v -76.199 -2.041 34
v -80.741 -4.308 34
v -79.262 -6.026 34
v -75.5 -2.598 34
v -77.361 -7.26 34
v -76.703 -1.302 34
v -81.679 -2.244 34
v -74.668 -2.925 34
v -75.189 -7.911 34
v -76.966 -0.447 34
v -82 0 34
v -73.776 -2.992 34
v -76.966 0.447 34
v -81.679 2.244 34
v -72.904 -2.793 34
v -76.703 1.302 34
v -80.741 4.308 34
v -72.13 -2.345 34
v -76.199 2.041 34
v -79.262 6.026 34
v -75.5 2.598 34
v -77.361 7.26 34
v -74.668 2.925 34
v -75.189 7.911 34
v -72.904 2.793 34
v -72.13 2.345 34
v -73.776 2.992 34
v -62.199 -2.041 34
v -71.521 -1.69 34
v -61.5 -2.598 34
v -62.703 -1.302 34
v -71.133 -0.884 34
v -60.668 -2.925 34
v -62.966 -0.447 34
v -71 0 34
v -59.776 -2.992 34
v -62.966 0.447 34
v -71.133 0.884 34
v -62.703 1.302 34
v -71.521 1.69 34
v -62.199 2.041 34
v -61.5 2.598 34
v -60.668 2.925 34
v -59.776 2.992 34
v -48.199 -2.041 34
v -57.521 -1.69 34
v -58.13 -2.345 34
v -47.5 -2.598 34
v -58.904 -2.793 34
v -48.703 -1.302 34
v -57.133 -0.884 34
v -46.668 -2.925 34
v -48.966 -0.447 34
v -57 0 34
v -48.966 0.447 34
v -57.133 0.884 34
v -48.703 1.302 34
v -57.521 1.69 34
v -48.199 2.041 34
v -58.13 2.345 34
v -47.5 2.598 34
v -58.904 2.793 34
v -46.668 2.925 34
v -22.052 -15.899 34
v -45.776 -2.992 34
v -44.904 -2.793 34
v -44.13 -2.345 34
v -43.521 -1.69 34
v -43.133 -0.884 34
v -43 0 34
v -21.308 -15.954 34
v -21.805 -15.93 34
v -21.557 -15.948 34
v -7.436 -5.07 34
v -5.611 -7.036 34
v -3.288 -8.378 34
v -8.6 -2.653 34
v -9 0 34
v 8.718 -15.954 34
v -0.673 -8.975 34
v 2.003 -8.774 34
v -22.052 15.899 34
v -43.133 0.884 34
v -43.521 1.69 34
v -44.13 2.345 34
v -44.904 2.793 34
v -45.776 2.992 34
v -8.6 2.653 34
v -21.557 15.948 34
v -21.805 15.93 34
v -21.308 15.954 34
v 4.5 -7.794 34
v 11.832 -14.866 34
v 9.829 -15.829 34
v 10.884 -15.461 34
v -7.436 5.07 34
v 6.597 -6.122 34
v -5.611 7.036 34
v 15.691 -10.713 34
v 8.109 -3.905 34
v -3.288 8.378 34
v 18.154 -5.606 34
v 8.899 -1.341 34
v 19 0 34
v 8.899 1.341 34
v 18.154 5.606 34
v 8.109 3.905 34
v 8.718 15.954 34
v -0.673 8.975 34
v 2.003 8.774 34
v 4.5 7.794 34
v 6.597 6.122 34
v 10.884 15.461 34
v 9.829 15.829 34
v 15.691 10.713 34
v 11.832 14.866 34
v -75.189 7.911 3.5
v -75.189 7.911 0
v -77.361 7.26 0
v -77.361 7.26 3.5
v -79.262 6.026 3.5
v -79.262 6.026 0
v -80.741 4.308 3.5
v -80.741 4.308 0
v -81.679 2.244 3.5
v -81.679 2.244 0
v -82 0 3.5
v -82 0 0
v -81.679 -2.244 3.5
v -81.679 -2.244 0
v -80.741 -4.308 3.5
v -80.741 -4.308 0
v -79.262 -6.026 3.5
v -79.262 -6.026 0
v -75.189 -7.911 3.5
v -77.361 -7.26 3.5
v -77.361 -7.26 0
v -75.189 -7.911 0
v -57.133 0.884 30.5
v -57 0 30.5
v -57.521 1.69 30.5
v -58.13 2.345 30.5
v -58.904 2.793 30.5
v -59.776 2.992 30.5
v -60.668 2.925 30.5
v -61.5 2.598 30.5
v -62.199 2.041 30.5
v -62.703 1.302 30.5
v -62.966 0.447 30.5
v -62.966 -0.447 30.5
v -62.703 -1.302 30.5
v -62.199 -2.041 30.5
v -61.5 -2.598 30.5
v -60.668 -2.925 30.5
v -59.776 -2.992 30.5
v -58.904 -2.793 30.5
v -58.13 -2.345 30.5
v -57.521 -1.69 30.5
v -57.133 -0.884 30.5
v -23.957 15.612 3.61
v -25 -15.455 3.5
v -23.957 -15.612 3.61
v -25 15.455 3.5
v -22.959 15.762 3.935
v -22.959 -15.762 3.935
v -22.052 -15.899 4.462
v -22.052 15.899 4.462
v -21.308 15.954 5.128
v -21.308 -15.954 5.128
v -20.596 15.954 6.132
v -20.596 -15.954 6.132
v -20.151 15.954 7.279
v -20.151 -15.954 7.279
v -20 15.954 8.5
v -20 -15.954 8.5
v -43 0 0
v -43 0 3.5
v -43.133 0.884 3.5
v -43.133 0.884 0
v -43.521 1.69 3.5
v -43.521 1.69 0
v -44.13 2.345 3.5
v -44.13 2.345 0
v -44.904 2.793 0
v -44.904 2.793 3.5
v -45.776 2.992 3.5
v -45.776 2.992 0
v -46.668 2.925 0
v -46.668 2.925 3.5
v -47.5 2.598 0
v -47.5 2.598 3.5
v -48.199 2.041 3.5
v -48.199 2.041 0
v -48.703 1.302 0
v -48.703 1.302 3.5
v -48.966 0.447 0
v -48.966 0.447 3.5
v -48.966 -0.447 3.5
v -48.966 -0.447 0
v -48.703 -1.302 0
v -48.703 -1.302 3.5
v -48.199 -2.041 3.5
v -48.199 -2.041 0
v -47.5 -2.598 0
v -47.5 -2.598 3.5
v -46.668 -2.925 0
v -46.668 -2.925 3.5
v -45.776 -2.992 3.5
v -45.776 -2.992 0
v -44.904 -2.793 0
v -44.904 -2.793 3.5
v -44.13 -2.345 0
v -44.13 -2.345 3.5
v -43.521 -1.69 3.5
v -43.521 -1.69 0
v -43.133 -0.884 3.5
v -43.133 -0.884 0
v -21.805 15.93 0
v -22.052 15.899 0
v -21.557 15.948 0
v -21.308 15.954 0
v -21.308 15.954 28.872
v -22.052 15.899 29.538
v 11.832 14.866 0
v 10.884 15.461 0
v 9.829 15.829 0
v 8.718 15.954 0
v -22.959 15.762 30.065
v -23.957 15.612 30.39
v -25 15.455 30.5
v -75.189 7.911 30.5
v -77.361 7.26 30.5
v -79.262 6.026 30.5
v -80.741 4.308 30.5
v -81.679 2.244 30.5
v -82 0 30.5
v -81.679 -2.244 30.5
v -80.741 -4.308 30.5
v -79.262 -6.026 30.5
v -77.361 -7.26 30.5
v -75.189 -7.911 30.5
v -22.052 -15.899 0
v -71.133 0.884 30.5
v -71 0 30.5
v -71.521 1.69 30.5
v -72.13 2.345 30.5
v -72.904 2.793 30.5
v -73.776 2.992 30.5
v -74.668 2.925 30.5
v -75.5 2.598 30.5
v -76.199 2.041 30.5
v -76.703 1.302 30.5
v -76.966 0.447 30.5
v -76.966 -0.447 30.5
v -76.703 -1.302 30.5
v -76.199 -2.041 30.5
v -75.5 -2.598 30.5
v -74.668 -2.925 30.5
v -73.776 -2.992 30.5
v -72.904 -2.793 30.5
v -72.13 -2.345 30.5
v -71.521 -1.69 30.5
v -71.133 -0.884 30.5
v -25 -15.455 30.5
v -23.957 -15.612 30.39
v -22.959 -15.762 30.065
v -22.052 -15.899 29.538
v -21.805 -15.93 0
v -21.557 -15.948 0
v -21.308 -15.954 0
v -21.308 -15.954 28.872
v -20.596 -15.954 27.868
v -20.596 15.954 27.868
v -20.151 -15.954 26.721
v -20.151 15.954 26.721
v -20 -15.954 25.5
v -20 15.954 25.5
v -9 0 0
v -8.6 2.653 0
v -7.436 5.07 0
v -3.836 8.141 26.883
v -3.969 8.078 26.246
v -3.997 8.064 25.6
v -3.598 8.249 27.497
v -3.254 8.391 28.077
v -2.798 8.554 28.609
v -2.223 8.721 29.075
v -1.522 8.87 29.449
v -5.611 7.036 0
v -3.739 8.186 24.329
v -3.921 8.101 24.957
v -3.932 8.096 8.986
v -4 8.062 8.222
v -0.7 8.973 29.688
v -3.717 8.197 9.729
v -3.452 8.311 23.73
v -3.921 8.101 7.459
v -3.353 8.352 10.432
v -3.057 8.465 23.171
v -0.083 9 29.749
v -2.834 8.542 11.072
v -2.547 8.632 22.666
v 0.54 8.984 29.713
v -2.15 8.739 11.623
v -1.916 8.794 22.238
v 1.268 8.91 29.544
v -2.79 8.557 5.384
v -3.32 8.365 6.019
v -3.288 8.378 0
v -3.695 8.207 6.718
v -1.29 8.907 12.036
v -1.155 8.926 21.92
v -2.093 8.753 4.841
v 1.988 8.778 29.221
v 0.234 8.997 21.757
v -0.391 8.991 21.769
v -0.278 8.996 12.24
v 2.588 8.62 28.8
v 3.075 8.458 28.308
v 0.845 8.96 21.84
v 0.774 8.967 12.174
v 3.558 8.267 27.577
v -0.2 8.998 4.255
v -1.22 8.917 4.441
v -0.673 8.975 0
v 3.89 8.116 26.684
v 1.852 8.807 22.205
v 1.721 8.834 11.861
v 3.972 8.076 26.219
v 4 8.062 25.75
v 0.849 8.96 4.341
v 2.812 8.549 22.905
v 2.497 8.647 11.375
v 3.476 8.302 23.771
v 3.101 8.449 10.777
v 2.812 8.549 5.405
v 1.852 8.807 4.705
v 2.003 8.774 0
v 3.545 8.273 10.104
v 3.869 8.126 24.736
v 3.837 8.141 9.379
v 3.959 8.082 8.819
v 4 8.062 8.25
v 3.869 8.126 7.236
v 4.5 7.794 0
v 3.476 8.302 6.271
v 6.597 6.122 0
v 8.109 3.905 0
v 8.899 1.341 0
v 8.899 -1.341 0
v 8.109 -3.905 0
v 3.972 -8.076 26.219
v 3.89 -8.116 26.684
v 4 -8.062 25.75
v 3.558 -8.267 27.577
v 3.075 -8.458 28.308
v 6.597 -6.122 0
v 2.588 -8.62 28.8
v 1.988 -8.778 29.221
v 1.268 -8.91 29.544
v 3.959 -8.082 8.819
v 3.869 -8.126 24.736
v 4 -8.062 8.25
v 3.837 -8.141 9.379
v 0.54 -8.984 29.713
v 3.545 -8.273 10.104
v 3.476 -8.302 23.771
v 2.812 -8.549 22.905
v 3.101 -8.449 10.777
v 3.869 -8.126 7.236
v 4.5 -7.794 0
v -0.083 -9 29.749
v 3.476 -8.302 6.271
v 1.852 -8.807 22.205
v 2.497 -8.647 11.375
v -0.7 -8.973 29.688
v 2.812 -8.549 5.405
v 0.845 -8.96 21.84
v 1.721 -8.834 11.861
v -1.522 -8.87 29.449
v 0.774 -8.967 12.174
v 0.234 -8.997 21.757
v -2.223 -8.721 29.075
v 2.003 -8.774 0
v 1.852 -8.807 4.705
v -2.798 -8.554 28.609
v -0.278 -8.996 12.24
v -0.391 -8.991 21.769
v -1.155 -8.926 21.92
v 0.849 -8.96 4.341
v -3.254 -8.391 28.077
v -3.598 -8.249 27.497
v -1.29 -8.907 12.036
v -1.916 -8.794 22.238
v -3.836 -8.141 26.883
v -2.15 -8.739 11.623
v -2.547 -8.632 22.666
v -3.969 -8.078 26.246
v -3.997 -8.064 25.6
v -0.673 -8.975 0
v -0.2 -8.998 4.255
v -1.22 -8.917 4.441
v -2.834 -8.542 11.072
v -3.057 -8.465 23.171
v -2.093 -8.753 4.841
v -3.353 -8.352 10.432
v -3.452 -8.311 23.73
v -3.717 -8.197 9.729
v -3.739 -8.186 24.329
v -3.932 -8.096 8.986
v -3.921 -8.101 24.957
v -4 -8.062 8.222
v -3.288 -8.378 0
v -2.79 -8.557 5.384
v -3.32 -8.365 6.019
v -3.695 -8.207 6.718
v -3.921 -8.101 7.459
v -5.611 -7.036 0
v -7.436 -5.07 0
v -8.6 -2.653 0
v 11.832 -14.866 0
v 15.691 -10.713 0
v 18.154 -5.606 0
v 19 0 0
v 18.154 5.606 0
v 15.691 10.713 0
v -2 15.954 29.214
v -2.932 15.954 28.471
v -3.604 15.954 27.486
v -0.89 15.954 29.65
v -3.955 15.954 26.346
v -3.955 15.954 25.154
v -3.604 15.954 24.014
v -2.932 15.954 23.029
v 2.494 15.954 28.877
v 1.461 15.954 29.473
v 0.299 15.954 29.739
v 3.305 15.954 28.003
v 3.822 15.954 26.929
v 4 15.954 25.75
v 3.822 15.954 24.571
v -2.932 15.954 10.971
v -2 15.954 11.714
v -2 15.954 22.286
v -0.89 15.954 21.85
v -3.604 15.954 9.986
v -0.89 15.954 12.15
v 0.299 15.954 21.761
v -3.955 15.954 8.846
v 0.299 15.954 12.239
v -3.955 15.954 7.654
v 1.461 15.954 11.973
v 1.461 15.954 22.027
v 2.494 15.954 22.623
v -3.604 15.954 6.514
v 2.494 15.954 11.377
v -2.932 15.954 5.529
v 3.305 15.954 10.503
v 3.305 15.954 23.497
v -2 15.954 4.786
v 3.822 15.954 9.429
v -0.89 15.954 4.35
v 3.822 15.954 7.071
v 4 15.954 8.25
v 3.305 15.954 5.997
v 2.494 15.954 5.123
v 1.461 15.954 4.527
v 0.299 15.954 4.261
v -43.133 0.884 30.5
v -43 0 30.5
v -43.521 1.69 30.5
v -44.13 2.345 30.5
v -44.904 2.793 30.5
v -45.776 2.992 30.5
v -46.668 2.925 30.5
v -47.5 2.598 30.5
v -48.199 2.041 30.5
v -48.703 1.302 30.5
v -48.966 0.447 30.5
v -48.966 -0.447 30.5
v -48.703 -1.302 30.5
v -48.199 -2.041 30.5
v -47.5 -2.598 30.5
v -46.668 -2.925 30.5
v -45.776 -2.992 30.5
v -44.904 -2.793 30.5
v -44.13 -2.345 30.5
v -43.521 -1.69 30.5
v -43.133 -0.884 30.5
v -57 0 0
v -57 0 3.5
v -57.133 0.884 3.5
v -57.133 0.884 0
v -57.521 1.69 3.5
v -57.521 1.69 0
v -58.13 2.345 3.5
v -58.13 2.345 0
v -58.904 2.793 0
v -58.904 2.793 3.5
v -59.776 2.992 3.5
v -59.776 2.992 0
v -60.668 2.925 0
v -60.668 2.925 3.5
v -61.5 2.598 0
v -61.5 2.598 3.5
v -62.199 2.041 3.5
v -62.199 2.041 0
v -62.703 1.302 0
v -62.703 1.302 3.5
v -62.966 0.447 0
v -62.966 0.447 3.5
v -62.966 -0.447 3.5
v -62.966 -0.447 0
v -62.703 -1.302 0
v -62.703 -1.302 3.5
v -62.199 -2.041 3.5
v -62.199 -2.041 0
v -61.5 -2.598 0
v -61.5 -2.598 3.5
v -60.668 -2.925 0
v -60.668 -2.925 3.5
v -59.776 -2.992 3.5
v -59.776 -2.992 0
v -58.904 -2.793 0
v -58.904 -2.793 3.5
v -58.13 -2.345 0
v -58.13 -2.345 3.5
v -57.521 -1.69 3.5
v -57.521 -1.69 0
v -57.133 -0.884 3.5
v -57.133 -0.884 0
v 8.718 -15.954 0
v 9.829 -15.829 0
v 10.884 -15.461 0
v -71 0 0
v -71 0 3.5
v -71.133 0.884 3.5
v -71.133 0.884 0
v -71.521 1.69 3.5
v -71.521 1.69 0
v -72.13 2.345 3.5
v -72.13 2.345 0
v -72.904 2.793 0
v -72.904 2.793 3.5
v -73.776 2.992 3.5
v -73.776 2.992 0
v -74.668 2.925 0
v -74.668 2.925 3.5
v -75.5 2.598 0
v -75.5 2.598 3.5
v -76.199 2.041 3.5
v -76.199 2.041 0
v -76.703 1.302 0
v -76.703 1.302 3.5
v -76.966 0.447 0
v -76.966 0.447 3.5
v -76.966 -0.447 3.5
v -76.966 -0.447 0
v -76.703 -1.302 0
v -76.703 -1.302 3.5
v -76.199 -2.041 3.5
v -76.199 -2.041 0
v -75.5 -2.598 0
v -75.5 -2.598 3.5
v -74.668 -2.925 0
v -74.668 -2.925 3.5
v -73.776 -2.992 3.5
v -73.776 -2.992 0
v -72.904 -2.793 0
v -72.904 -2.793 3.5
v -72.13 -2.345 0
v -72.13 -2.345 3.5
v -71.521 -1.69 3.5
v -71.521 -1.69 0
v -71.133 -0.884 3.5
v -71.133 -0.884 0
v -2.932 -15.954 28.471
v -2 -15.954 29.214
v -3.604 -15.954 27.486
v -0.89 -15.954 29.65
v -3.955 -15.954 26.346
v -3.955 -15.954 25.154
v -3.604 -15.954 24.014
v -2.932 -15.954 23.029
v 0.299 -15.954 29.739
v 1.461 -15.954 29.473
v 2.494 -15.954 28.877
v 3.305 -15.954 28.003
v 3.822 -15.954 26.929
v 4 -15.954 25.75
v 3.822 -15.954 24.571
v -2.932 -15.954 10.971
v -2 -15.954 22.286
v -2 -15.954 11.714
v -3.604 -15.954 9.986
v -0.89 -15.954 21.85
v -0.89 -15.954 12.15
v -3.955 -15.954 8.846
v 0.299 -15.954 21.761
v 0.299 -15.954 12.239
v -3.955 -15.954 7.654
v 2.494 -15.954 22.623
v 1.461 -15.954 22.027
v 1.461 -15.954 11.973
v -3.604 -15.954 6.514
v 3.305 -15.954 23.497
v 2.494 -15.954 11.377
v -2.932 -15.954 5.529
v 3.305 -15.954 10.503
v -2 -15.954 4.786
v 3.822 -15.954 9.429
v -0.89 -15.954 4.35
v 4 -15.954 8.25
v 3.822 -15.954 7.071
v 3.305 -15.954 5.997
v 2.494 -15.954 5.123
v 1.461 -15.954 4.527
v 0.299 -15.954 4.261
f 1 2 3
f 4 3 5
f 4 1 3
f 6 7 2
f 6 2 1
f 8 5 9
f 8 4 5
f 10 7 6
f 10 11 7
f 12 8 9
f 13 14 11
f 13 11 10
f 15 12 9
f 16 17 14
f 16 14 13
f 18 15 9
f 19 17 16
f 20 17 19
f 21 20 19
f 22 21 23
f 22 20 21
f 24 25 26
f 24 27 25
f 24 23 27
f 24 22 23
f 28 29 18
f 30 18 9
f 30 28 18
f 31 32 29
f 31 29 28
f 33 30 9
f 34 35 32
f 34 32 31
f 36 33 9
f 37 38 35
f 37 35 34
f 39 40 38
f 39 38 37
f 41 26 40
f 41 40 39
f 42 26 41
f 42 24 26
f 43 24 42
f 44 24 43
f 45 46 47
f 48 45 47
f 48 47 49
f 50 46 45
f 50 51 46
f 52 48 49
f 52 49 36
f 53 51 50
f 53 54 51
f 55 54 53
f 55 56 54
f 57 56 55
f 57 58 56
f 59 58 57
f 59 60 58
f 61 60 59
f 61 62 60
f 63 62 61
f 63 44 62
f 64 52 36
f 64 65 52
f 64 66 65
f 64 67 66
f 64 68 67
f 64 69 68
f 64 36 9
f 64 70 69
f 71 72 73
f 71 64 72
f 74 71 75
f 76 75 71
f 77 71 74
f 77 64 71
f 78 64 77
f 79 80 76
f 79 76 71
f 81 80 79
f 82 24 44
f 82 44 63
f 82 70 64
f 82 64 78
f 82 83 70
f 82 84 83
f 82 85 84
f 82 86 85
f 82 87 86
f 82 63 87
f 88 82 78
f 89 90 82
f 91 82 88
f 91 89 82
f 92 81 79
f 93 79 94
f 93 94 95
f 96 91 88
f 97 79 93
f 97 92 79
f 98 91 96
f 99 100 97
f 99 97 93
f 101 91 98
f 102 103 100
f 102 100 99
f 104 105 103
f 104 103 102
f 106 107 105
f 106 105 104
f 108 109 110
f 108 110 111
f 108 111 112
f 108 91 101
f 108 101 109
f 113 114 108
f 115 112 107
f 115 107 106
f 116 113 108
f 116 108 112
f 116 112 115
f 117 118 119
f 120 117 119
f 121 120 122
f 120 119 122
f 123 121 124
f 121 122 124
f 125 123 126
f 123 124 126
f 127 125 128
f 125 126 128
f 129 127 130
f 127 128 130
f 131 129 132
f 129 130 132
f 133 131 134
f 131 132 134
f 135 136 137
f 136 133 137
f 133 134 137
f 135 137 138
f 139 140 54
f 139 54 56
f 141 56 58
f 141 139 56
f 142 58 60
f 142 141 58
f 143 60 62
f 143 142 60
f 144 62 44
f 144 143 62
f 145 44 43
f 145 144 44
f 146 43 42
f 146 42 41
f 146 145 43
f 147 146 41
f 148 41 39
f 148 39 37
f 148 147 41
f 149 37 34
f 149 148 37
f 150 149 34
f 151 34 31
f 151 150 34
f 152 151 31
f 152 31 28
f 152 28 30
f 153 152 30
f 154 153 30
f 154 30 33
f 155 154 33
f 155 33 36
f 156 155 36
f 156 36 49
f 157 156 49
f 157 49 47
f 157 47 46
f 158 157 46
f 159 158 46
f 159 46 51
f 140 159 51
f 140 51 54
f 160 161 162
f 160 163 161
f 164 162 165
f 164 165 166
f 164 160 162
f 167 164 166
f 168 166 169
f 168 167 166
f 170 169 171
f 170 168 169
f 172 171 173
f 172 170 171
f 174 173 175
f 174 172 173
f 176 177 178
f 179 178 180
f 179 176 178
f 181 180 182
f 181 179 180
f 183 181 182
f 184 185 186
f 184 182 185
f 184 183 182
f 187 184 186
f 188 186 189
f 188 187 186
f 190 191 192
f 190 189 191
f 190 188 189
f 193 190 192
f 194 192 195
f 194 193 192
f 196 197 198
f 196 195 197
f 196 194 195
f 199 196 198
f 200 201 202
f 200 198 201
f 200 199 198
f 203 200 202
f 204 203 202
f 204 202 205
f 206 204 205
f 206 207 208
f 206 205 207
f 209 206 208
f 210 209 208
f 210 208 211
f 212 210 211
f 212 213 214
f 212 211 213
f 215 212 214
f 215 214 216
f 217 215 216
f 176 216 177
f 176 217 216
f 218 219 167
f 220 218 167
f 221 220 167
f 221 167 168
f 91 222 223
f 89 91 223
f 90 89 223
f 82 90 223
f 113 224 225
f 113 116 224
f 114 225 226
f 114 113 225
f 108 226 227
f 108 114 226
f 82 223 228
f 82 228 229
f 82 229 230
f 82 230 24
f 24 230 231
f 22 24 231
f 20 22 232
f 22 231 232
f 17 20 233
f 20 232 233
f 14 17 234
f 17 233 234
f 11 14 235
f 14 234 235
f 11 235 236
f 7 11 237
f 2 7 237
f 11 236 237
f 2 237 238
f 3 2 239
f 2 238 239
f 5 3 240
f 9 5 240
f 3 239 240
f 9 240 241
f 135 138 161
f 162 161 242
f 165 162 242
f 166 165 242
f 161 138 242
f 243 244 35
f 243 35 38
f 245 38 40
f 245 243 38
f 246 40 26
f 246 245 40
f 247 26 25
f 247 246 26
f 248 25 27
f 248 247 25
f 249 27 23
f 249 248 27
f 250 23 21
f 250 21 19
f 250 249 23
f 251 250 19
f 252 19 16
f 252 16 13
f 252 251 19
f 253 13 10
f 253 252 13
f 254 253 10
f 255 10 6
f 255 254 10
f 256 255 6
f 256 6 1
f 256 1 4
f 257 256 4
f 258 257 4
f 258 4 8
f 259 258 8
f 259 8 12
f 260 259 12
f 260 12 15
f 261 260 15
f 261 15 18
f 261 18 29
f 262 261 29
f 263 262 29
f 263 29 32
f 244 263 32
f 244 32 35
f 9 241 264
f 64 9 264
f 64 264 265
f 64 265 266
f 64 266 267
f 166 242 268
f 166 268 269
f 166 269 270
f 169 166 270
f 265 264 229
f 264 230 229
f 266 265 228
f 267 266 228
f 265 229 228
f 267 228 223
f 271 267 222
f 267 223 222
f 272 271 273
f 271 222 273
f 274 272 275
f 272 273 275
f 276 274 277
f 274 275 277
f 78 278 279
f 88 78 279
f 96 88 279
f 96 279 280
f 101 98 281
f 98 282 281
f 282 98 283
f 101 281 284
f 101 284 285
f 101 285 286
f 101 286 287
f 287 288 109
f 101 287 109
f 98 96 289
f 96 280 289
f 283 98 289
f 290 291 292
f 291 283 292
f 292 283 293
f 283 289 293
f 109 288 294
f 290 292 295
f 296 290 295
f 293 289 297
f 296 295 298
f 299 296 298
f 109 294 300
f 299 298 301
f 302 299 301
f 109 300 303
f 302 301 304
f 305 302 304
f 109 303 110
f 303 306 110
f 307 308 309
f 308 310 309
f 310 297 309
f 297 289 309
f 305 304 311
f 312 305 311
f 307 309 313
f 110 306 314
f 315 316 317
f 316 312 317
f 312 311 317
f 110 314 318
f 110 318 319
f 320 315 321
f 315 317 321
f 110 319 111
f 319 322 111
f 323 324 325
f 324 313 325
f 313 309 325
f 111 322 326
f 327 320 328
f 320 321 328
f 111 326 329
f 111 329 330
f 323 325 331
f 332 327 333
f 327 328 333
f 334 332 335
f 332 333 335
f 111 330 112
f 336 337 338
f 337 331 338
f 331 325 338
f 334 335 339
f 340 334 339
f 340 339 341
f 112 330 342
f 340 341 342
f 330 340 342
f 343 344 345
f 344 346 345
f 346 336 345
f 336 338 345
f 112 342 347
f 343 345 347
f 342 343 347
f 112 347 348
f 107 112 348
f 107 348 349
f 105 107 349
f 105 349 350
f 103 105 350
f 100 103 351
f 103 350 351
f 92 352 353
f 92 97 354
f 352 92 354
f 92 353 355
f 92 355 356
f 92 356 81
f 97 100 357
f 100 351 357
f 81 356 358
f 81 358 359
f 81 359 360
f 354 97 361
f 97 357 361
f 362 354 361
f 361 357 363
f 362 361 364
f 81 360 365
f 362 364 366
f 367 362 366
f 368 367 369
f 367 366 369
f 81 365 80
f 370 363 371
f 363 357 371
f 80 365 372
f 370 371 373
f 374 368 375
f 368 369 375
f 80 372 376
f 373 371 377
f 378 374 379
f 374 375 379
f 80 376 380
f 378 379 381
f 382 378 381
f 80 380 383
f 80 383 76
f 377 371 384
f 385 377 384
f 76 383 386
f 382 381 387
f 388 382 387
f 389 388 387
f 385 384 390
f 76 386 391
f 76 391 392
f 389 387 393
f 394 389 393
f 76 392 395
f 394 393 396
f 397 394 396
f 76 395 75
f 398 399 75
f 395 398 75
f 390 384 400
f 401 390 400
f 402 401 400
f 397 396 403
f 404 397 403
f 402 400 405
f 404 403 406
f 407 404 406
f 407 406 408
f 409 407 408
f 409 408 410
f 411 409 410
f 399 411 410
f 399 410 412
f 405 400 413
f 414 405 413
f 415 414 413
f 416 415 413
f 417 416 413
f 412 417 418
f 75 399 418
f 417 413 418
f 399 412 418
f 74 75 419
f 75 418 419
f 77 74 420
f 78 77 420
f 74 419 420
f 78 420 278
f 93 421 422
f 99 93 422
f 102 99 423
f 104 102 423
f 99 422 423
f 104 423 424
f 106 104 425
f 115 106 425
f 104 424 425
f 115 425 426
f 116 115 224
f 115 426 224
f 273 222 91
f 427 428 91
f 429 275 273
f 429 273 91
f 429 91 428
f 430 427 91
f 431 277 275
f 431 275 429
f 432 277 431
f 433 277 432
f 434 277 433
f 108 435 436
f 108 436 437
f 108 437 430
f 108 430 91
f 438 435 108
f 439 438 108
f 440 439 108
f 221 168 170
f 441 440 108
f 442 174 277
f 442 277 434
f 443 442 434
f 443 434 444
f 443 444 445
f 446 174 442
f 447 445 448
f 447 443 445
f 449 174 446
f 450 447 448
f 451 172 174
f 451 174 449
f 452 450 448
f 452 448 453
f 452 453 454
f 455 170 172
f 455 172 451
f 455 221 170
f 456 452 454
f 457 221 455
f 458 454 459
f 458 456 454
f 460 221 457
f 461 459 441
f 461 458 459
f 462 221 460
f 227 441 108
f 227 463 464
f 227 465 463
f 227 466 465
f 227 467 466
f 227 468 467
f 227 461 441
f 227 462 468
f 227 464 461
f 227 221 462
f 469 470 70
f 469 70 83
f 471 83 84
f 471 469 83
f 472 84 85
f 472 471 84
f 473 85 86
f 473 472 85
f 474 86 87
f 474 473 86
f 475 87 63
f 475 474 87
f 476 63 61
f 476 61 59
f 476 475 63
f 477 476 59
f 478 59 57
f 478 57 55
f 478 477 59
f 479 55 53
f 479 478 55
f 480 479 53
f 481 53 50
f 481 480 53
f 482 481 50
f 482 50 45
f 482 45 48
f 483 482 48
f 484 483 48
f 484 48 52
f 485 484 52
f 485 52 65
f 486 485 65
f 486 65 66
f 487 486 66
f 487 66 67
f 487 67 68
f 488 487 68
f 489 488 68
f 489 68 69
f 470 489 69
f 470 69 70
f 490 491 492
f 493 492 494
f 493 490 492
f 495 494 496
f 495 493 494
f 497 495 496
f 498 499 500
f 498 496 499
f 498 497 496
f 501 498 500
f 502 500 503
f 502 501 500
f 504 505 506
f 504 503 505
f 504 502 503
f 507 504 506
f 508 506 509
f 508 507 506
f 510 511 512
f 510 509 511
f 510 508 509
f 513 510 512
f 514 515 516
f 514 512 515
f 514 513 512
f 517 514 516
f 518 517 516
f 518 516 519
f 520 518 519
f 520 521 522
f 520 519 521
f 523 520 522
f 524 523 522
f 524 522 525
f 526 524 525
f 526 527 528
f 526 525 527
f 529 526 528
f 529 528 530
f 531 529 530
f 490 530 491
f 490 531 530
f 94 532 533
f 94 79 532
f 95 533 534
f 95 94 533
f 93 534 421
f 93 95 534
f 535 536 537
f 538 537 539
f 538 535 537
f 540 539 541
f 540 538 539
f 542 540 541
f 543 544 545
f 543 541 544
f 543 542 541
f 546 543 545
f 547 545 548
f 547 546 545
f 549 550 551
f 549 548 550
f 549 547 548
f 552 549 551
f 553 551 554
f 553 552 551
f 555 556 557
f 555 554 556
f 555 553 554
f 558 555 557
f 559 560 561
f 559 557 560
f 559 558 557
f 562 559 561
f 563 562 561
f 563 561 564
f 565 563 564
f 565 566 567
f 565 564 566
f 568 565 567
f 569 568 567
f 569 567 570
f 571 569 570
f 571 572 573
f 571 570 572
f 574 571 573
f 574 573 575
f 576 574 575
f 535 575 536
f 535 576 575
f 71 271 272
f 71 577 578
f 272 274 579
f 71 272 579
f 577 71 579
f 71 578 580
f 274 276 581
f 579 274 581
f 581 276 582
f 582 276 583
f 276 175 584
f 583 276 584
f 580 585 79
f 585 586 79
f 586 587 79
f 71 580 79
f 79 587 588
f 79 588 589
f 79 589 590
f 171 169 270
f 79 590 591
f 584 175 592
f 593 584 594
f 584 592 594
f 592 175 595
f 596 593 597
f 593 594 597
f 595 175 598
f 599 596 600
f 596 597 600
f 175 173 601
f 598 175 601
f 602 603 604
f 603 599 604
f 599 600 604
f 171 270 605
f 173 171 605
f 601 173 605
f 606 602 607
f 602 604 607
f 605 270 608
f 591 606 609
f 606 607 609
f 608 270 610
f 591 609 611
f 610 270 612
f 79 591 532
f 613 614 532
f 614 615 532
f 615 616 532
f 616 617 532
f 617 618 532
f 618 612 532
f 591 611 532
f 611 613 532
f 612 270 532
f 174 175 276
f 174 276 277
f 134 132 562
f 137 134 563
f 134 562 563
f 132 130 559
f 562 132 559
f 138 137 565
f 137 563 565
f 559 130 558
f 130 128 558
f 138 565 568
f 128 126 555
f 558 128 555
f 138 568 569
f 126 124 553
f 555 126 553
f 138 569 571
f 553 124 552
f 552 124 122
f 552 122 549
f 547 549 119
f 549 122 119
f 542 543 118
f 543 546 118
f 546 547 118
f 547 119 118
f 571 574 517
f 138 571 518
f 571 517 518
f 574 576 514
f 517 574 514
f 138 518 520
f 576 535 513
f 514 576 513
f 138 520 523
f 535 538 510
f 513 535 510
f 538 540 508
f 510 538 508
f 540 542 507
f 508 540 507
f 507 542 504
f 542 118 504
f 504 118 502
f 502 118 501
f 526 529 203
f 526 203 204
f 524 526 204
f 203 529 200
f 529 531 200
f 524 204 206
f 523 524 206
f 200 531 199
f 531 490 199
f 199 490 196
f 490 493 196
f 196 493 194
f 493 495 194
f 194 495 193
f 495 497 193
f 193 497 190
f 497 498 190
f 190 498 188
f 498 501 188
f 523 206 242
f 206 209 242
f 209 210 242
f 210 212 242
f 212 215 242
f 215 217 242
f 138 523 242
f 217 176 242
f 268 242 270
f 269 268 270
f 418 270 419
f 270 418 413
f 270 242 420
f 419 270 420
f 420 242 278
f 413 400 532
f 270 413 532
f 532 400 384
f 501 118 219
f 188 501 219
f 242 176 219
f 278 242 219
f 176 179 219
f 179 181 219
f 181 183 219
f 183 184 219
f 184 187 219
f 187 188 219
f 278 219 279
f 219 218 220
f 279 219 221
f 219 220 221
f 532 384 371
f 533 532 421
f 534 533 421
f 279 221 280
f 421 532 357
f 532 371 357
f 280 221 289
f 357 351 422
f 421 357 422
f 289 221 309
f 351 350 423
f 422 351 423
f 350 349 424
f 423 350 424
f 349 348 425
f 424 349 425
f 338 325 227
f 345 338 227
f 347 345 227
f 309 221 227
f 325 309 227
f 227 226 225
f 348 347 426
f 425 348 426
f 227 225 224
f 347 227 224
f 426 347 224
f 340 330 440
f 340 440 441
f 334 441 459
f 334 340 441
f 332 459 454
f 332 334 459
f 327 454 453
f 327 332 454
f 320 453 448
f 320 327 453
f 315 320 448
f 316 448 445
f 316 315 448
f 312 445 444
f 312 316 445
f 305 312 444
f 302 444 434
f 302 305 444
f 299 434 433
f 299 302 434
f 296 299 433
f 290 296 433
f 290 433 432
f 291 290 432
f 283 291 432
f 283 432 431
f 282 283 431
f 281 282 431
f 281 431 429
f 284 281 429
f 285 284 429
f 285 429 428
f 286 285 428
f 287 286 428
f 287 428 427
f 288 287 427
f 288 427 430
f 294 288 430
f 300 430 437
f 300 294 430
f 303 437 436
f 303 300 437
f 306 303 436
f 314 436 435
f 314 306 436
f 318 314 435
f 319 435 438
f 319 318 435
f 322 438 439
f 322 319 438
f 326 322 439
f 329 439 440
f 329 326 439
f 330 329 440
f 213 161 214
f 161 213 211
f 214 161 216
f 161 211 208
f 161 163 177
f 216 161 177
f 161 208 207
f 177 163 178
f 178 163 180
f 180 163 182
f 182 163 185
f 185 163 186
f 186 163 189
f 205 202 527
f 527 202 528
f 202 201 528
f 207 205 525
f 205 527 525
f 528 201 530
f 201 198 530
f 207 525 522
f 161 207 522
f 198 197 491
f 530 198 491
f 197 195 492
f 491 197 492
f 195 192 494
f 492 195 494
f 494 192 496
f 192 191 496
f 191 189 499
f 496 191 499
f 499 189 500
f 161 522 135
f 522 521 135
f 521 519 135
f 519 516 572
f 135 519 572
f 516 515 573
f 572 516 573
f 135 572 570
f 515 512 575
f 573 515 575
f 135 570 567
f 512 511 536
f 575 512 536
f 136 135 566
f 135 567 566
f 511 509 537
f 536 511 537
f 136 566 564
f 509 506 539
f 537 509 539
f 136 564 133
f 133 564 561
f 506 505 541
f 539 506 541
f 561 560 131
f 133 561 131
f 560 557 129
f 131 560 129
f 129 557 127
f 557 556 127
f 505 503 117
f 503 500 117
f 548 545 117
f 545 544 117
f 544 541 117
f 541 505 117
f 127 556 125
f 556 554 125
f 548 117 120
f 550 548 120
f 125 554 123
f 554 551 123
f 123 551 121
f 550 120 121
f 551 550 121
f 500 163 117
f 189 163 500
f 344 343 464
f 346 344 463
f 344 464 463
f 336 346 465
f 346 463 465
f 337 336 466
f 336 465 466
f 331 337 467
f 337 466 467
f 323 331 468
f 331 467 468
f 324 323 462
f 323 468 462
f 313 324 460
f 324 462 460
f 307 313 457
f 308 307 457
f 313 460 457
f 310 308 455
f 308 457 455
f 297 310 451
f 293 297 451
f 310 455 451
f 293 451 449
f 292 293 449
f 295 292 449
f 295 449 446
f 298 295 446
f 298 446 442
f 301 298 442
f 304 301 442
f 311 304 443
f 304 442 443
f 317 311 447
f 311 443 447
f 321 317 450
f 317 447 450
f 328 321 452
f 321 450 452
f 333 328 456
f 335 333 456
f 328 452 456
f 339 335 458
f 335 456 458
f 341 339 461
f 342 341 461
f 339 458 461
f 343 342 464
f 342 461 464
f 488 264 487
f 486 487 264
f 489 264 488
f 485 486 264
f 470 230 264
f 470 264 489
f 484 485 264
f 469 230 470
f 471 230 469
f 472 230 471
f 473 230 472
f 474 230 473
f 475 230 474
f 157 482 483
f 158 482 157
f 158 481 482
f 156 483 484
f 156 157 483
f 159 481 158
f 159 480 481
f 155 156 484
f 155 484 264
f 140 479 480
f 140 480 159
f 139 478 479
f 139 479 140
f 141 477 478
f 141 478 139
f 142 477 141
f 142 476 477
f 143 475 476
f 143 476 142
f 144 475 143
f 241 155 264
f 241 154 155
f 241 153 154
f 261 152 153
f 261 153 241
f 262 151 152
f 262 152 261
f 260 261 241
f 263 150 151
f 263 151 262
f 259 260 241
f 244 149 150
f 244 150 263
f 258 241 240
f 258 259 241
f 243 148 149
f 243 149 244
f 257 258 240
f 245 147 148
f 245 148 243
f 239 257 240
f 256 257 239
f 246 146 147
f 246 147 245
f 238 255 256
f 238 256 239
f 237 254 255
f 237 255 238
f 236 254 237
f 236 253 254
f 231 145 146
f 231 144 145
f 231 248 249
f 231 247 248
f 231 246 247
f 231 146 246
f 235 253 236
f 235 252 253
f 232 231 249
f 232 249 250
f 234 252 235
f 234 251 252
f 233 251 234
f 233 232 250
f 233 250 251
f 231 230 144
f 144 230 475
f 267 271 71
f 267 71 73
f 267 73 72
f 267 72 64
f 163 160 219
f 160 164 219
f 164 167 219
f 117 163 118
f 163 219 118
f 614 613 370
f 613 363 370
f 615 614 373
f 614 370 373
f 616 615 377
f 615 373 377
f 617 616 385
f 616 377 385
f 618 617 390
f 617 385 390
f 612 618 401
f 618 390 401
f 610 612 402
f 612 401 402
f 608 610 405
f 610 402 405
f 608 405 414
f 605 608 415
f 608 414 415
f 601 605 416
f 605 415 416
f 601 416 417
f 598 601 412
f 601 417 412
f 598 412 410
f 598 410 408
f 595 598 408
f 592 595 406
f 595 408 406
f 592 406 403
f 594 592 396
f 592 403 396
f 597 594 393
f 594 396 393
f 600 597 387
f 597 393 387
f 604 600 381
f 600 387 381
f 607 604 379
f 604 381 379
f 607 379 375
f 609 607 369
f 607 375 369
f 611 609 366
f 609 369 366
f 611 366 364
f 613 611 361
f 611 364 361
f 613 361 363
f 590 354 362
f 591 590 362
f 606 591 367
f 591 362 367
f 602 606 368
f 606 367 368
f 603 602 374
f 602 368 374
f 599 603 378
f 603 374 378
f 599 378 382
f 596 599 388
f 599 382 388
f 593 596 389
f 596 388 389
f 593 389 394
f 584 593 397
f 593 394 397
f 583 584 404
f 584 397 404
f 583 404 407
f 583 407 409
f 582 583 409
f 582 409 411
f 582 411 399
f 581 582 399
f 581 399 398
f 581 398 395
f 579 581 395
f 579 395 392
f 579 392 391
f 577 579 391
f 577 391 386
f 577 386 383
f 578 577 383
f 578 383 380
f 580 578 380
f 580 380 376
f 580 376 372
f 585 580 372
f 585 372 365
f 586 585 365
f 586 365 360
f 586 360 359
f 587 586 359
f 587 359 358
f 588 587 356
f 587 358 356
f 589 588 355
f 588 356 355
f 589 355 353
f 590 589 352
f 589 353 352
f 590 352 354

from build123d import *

# Parameters (mm, degrees)
SKETCH_1_R          = 3
SKETCH_1_W          = 32
SKETCH_1_H          = 31.908510126
EXTRUDE_1_DEPTH     = 34
CUT_EXTRUDE_START   = -3.5
SKETCH_4_W          = 70
SKETCH_4_H          = 50
CUT_EXTRUDE_3_DEPTH = 27
FILLET_1_R          = 5
SKETCH_3_R          = 9
CUT_EXTRUDE_5_DEPTH = 35
SKETCH_8_R          = 4
CUT_EXTRUDE_6_DEPTH = 20
FILLET_2_R          = 5


with BuildPart() as part:
    # 草圖1 → 填料-伸長1 (new body)
    with BuildSketch(Plane.XY):
        with BuildLine():
            Line((-21.681969888, -15.954255063), (-21.681969888, 15.954255063))
            Line((-21.681969888, 15.954255063), (-75.189189189, 7.911120595))
            ThreePointArc((-75.189189189, 7.911120595), (-82, 0), (-75.189189189, -7.911120595))
            Line((-75.189189189, -7.911120595), (-21.681969888, -15.954255063))
        make_face()
        with Locations((-74, 0)):
            Circle(SKETCH_1_R, mode=Mode.SUBTRACT)
        with Locations((-60, 0)):
            Circle(SKETCH_1_R, mode=Mode.SUBTRACT)
        with Locations((-46, 0)):
            Circle(SKETCH_1_R, mode=Mode.SUBTRACT)
        with Locations((-5.681969888, 0)):
            Rectangle(SKETCH_1_W, SKETCH_1_H)
        with BuildLine():
            ThreePointArc((10.318030112, -15.954255063), (19, 0), (10.318030112, 15.954255063))
            Line((10.318030112, 15.954255063), (10.318030112, -15.954255063))
        make_face()
    extrude(amount=EXTRUDE_1_DEPTH)

    # 草圖4 → 除料-伸長3 (cut)
    with BuildSketch(Plane(origin=(0, 0, 0), x_dir=(-1, 0, 0), z_dir=(0, 0, -1)).offset(CUT_EXTRUDE_START)):
        with Locations((55, 0)):
            Rectangle(SKETCH_4_W, SKETCH_4_H)
    extrude(amount=-CUT_EXTRUDE_3_DEPTH, mode=Mode.SUBTRACT)

    # 圓角1
    fillet_1_edges = [part.edges().sort_by_distance(p)[0] for p in [
        (-20, 0, 3.5),
        (-20, 0, 30.5),
    ]]
    fillet(fillet_1_edges, radius=FILLET_1_R)

    # 草圖3 → 除料-伸長5 (cut, through all)
    with BuildSketch(Plane(origin=(0, 0, 0), x_dir=(-1, 0, 0), z_dir=(0, 0, -1))):
        Circle(SKETCH_3_R)
    extrude(amount=-CUT_EXTRUDE_5_DEPTH, mode=Mode.SUBTRACT)

    # 草圖8 → 除料-伸長6 (cut, symmetric)
    with BuildSketch(Plane(origin=(0, 0, 0), x_dir=(1, 0, 0), z_dir=(0, 1, 0))):
        with Locations((0, -25.75)):
            Circle(SKETCH_8_R)
        with Locations((0, -8.25)):
            Circle(SKETCH_8_R)
    extrude(amount=CUT_EXTRUDE_6_DEPTH, both=True, mode=Mode.SUBTRACT)

    # 圓角2
    fillet_2_edges = [part.edges().sort_by_distance(p)[0] for p in [
        (-21.681969888, -15.954255063, 2.379794385),
        (-21.681969888, -15.954255063, 31.620205615),
        (-21.681969888, 15.954255063, 2.379794385),
        (-21.681969888, 15.954255063, 31.620205615),
        (10.318030112, -15.954255063, 17),
        (10.318030112, 15.954255063, 17),
    ]]
    fillet(fillet_2_edges, radius=FILLET_2_R)


solid = part.part
